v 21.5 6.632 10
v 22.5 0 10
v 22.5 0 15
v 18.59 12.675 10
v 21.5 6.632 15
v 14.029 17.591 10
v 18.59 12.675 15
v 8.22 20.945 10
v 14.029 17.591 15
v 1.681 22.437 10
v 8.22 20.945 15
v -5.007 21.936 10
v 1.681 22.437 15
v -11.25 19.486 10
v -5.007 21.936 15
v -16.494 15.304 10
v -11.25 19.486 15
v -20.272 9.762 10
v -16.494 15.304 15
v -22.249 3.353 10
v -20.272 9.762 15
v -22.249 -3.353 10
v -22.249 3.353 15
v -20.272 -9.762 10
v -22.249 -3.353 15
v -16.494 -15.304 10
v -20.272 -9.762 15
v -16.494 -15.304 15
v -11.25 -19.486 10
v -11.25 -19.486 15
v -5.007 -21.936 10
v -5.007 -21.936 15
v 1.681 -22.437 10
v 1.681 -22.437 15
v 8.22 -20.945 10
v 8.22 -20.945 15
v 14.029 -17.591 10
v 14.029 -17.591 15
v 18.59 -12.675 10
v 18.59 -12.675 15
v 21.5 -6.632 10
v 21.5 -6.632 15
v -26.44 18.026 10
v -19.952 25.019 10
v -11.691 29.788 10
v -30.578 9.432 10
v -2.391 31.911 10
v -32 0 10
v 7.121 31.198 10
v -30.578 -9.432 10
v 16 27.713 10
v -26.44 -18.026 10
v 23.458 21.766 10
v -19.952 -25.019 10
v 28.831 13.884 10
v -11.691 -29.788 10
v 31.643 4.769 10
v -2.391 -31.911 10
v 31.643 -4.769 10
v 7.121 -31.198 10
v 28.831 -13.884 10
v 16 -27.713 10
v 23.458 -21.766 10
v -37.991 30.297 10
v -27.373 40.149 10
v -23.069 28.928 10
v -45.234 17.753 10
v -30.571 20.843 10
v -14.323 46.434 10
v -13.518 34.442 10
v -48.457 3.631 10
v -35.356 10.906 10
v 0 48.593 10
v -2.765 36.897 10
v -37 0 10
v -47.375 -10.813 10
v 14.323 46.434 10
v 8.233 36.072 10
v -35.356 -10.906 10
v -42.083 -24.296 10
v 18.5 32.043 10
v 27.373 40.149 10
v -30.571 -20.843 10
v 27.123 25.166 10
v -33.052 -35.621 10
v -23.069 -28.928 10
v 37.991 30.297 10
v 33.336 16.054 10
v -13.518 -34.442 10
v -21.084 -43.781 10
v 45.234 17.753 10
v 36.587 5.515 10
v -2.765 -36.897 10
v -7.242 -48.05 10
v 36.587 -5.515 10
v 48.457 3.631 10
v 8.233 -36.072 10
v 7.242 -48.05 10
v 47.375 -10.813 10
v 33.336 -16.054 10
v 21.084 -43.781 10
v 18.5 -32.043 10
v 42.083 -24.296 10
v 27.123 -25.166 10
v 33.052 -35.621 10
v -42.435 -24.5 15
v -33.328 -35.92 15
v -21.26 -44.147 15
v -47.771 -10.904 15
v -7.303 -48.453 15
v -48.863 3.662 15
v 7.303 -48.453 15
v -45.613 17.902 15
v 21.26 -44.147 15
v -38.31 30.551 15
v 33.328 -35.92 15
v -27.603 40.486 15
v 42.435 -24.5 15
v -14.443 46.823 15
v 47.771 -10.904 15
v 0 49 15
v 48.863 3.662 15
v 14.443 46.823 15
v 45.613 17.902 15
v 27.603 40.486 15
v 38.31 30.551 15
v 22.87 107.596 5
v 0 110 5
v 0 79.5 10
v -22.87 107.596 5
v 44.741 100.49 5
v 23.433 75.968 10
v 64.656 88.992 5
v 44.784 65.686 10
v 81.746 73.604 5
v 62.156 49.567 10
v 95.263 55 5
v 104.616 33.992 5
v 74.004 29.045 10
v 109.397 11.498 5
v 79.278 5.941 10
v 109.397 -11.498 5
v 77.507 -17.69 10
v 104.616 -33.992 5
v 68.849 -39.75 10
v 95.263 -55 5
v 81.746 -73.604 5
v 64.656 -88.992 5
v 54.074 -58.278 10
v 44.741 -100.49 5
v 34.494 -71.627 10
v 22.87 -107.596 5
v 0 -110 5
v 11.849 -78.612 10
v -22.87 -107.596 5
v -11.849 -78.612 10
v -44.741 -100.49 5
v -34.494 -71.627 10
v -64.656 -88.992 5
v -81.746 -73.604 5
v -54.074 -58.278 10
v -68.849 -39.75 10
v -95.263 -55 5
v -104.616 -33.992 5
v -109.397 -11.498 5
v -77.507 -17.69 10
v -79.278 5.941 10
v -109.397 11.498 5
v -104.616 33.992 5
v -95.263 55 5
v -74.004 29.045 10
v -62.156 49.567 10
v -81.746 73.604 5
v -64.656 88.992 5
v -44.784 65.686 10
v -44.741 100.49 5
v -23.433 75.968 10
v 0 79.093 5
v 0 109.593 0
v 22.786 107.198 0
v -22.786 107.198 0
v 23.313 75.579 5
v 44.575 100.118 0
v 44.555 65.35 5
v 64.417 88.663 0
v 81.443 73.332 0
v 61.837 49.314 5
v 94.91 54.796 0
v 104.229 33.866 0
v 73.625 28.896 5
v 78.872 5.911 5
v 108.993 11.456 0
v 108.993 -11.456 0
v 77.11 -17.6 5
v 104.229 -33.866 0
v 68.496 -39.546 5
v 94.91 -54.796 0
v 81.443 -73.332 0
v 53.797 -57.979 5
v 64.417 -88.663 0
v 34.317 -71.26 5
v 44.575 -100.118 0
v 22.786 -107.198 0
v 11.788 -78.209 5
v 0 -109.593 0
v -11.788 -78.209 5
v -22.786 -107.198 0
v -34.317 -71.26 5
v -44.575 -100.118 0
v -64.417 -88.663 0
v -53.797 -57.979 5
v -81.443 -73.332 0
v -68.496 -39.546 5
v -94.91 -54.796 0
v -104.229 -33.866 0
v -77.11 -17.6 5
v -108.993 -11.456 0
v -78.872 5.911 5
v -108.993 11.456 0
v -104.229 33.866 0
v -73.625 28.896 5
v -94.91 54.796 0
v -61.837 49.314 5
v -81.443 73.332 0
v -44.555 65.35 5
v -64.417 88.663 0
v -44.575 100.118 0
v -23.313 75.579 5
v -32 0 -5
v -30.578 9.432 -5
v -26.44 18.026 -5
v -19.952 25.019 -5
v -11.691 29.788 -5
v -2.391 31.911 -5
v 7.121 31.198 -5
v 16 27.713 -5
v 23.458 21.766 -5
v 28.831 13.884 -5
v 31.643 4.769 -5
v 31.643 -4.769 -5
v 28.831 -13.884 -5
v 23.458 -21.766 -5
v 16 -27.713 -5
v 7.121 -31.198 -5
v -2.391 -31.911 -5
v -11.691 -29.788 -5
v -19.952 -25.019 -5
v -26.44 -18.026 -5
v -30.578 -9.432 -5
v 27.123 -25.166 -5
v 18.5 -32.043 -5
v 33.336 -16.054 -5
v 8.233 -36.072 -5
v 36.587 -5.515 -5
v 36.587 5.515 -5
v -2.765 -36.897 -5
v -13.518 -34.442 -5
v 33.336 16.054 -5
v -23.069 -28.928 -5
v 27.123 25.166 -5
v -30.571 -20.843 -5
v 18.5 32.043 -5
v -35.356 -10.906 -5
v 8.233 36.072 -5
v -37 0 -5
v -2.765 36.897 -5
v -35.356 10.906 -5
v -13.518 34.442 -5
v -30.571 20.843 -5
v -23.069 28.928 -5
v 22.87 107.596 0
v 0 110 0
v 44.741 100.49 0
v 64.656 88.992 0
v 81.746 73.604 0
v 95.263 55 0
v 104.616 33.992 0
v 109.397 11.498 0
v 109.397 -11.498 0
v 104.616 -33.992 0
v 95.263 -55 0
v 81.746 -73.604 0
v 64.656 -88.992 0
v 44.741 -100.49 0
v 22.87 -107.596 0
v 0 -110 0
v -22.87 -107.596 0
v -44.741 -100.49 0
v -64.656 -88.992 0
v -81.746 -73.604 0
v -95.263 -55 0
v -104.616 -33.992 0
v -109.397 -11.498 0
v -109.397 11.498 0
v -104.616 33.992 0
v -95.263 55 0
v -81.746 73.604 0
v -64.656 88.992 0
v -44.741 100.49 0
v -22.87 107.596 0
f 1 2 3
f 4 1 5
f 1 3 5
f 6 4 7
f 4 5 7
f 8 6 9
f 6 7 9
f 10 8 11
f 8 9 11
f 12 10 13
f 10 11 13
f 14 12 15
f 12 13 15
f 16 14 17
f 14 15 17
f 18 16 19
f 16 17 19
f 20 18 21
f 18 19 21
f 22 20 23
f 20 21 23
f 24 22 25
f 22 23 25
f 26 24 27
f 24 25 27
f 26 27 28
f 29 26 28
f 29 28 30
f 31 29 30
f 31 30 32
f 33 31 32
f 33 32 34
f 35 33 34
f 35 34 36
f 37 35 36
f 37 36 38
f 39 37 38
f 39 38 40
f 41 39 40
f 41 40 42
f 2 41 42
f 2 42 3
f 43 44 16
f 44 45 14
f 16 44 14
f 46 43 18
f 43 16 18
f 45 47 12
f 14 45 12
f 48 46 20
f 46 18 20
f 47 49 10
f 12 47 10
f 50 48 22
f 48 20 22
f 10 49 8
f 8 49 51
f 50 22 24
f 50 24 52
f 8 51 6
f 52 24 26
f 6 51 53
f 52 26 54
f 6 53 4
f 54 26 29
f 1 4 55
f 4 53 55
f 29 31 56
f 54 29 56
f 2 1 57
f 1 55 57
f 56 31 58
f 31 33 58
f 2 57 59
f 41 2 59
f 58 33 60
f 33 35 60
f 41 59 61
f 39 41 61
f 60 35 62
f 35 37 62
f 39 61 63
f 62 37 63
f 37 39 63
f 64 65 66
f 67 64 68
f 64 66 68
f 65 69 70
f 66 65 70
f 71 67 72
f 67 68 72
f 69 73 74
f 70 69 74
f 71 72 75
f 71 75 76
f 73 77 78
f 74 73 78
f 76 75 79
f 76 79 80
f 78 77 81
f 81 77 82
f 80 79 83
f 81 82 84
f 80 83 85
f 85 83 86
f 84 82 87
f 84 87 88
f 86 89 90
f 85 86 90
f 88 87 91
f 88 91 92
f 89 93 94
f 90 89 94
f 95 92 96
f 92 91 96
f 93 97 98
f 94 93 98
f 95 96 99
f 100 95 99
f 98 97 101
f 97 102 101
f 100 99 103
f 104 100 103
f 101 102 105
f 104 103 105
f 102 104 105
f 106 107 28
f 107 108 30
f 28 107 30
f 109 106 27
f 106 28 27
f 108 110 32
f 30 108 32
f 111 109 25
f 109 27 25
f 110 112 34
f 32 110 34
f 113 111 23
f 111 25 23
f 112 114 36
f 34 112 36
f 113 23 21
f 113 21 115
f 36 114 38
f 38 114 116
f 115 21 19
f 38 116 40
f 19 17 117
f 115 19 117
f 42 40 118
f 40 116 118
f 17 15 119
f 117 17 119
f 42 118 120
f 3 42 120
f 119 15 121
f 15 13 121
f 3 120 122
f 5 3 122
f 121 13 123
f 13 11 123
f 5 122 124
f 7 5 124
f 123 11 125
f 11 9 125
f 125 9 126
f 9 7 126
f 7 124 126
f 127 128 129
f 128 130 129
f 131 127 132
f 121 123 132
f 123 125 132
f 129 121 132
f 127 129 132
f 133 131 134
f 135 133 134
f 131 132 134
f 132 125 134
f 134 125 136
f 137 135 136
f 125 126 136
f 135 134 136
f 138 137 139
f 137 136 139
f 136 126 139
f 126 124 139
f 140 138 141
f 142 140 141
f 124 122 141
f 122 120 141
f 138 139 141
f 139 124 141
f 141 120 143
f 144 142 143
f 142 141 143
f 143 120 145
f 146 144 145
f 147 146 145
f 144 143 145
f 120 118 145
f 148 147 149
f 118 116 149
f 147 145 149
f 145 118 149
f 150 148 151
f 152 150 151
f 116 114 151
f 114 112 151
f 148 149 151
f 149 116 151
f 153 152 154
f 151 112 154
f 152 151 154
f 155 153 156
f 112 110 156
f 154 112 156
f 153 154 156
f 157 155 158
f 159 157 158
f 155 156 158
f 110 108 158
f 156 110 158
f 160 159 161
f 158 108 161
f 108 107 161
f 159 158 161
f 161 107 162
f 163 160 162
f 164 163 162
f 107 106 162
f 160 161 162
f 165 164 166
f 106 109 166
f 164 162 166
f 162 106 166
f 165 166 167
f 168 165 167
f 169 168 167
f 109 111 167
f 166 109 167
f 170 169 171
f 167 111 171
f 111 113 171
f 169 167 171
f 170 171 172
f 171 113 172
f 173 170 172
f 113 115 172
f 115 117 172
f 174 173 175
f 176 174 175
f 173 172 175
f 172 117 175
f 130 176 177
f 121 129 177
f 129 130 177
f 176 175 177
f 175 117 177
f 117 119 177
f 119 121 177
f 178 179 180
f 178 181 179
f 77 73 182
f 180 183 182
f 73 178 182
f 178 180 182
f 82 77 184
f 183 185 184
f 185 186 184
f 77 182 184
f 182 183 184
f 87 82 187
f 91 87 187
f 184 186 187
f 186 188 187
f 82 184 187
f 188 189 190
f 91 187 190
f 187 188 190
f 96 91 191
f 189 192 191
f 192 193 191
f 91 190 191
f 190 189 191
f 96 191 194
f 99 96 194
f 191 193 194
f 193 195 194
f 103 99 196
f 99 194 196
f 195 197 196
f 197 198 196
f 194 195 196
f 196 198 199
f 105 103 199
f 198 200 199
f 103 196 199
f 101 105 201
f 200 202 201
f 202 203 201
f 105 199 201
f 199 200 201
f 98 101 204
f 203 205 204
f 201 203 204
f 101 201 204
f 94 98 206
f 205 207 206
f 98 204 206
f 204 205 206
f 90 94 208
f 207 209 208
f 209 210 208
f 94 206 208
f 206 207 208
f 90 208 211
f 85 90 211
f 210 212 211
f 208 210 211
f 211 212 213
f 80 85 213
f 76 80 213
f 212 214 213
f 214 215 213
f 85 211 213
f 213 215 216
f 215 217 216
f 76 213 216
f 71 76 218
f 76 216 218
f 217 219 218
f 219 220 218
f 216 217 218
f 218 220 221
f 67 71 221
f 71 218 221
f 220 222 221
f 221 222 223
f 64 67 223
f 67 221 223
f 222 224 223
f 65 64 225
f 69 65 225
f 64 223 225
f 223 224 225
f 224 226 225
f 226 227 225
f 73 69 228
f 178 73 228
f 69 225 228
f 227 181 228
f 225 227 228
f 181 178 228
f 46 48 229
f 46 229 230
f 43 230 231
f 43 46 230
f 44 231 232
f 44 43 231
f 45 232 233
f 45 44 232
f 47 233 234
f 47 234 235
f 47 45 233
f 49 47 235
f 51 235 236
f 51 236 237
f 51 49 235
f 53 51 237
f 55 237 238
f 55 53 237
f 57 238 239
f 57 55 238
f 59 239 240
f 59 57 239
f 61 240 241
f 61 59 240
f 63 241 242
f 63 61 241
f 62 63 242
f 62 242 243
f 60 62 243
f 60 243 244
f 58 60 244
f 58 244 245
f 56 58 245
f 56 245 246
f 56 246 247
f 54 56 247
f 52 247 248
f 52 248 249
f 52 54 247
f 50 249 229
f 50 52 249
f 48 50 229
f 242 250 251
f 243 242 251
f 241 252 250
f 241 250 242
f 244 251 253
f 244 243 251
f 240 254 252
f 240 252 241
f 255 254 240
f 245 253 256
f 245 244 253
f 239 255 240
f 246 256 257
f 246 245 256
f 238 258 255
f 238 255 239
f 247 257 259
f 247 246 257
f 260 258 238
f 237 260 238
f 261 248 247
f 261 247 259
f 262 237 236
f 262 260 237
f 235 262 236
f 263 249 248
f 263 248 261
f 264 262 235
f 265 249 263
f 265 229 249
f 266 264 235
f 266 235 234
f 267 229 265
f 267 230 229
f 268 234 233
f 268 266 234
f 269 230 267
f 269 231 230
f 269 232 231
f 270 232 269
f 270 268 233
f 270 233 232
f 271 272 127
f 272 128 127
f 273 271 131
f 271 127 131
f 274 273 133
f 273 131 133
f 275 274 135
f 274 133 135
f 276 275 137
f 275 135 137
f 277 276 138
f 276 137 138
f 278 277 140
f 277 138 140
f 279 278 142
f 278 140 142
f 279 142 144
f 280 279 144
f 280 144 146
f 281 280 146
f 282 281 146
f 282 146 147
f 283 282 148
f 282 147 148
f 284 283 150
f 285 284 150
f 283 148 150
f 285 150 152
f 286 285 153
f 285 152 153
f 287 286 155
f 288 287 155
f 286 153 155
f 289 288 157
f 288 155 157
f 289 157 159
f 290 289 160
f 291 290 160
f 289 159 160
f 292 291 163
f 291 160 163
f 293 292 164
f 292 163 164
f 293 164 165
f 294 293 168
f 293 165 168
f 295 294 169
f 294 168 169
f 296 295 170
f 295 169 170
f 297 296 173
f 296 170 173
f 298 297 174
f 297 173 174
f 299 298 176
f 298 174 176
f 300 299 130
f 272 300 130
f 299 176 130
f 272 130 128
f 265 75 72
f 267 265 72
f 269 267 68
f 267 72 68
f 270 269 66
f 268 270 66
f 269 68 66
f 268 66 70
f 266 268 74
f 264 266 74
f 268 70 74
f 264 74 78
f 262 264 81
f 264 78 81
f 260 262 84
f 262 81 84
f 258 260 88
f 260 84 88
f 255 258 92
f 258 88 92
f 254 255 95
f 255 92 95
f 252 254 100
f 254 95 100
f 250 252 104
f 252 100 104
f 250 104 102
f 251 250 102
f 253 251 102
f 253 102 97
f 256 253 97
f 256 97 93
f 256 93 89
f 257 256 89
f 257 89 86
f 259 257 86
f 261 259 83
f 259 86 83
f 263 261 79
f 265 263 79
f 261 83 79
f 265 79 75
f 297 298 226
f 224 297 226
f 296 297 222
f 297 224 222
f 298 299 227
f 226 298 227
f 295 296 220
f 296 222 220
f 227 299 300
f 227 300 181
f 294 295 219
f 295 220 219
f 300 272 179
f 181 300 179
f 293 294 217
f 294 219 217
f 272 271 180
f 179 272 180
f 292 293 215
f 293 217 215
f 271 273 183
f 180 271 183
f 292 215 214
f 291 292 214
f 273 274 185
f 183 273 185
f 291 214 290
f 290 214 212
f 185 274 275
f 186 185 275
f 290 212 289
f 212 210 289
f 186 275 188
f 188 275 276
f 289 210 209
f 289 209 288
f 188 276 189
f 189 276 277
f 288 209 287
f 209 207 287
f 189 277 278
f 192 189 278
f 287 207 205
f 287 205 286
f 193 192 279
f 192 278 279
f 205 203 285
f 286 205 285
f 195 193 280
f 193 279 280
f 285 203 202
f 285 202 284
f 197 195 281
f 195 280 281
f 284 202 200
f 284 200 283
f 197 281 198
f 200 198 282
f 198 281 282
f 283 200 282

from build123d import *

# Parameters (mm, degrees)
SKETCH1_R           = 22.5
BOSS_EXTRUDE1_DEPTH = 15
SKETCH3_R           = 22.5
CUT_EXTRUDE1_DEPTH  = 43
SKETCH4_R           = 37
SKETCH4_R_2         = 32
BOSS_EXTRUDE2_DEPTH = 15


with BuildPart() as part:
    # Sketch1 → Boss-Extrude1 (new body)
    with BuildSketch(Plane.XY):
        Circle(SKETCH1_R)
    extrude(amount=BOSS_EXTRUDE1_DEPTH)

    # Sketch2 → Revolve1 (revolve)
    with BuildSketch(Plane(origin=(0, 0, 0), x_dir=(0, 0, -1), z_dir=(1, 0, 0))):
        Polygon((-15, 49), (-15, 22.5), (-10, 22.5), (-10, 48.592881079), (0, 109.592881079), (0, 110), (-5, 110), align=None)
    revolve(axis=Axis((0, 0, 15), (0, 0, -1)))

    # Sketch3 → Cut-Extrude1 (cut)
    with BuildSketch(Plane.XY.offset(15)):
        Circle(SKETCH3_R)
    extrude(amount=-CUT_EXTRUDE1_DEPTH, mode=Mode.SUBTRACT)

    # Sketch4 → Boss-Extrude2 (add)
    with BuildSketch(Plane(origin=(0, 0, 10), x_dir=(-1, 0, 0), z_dir=(0, 0, -1))):
        Circle(SKETCH4_R)
        Circle(SKETCH4_R_2, mode=Mode.SUBTRACT)
    extrude(amount=BOSS_EXTRUDE2_DEPTH)


solid = part.part
